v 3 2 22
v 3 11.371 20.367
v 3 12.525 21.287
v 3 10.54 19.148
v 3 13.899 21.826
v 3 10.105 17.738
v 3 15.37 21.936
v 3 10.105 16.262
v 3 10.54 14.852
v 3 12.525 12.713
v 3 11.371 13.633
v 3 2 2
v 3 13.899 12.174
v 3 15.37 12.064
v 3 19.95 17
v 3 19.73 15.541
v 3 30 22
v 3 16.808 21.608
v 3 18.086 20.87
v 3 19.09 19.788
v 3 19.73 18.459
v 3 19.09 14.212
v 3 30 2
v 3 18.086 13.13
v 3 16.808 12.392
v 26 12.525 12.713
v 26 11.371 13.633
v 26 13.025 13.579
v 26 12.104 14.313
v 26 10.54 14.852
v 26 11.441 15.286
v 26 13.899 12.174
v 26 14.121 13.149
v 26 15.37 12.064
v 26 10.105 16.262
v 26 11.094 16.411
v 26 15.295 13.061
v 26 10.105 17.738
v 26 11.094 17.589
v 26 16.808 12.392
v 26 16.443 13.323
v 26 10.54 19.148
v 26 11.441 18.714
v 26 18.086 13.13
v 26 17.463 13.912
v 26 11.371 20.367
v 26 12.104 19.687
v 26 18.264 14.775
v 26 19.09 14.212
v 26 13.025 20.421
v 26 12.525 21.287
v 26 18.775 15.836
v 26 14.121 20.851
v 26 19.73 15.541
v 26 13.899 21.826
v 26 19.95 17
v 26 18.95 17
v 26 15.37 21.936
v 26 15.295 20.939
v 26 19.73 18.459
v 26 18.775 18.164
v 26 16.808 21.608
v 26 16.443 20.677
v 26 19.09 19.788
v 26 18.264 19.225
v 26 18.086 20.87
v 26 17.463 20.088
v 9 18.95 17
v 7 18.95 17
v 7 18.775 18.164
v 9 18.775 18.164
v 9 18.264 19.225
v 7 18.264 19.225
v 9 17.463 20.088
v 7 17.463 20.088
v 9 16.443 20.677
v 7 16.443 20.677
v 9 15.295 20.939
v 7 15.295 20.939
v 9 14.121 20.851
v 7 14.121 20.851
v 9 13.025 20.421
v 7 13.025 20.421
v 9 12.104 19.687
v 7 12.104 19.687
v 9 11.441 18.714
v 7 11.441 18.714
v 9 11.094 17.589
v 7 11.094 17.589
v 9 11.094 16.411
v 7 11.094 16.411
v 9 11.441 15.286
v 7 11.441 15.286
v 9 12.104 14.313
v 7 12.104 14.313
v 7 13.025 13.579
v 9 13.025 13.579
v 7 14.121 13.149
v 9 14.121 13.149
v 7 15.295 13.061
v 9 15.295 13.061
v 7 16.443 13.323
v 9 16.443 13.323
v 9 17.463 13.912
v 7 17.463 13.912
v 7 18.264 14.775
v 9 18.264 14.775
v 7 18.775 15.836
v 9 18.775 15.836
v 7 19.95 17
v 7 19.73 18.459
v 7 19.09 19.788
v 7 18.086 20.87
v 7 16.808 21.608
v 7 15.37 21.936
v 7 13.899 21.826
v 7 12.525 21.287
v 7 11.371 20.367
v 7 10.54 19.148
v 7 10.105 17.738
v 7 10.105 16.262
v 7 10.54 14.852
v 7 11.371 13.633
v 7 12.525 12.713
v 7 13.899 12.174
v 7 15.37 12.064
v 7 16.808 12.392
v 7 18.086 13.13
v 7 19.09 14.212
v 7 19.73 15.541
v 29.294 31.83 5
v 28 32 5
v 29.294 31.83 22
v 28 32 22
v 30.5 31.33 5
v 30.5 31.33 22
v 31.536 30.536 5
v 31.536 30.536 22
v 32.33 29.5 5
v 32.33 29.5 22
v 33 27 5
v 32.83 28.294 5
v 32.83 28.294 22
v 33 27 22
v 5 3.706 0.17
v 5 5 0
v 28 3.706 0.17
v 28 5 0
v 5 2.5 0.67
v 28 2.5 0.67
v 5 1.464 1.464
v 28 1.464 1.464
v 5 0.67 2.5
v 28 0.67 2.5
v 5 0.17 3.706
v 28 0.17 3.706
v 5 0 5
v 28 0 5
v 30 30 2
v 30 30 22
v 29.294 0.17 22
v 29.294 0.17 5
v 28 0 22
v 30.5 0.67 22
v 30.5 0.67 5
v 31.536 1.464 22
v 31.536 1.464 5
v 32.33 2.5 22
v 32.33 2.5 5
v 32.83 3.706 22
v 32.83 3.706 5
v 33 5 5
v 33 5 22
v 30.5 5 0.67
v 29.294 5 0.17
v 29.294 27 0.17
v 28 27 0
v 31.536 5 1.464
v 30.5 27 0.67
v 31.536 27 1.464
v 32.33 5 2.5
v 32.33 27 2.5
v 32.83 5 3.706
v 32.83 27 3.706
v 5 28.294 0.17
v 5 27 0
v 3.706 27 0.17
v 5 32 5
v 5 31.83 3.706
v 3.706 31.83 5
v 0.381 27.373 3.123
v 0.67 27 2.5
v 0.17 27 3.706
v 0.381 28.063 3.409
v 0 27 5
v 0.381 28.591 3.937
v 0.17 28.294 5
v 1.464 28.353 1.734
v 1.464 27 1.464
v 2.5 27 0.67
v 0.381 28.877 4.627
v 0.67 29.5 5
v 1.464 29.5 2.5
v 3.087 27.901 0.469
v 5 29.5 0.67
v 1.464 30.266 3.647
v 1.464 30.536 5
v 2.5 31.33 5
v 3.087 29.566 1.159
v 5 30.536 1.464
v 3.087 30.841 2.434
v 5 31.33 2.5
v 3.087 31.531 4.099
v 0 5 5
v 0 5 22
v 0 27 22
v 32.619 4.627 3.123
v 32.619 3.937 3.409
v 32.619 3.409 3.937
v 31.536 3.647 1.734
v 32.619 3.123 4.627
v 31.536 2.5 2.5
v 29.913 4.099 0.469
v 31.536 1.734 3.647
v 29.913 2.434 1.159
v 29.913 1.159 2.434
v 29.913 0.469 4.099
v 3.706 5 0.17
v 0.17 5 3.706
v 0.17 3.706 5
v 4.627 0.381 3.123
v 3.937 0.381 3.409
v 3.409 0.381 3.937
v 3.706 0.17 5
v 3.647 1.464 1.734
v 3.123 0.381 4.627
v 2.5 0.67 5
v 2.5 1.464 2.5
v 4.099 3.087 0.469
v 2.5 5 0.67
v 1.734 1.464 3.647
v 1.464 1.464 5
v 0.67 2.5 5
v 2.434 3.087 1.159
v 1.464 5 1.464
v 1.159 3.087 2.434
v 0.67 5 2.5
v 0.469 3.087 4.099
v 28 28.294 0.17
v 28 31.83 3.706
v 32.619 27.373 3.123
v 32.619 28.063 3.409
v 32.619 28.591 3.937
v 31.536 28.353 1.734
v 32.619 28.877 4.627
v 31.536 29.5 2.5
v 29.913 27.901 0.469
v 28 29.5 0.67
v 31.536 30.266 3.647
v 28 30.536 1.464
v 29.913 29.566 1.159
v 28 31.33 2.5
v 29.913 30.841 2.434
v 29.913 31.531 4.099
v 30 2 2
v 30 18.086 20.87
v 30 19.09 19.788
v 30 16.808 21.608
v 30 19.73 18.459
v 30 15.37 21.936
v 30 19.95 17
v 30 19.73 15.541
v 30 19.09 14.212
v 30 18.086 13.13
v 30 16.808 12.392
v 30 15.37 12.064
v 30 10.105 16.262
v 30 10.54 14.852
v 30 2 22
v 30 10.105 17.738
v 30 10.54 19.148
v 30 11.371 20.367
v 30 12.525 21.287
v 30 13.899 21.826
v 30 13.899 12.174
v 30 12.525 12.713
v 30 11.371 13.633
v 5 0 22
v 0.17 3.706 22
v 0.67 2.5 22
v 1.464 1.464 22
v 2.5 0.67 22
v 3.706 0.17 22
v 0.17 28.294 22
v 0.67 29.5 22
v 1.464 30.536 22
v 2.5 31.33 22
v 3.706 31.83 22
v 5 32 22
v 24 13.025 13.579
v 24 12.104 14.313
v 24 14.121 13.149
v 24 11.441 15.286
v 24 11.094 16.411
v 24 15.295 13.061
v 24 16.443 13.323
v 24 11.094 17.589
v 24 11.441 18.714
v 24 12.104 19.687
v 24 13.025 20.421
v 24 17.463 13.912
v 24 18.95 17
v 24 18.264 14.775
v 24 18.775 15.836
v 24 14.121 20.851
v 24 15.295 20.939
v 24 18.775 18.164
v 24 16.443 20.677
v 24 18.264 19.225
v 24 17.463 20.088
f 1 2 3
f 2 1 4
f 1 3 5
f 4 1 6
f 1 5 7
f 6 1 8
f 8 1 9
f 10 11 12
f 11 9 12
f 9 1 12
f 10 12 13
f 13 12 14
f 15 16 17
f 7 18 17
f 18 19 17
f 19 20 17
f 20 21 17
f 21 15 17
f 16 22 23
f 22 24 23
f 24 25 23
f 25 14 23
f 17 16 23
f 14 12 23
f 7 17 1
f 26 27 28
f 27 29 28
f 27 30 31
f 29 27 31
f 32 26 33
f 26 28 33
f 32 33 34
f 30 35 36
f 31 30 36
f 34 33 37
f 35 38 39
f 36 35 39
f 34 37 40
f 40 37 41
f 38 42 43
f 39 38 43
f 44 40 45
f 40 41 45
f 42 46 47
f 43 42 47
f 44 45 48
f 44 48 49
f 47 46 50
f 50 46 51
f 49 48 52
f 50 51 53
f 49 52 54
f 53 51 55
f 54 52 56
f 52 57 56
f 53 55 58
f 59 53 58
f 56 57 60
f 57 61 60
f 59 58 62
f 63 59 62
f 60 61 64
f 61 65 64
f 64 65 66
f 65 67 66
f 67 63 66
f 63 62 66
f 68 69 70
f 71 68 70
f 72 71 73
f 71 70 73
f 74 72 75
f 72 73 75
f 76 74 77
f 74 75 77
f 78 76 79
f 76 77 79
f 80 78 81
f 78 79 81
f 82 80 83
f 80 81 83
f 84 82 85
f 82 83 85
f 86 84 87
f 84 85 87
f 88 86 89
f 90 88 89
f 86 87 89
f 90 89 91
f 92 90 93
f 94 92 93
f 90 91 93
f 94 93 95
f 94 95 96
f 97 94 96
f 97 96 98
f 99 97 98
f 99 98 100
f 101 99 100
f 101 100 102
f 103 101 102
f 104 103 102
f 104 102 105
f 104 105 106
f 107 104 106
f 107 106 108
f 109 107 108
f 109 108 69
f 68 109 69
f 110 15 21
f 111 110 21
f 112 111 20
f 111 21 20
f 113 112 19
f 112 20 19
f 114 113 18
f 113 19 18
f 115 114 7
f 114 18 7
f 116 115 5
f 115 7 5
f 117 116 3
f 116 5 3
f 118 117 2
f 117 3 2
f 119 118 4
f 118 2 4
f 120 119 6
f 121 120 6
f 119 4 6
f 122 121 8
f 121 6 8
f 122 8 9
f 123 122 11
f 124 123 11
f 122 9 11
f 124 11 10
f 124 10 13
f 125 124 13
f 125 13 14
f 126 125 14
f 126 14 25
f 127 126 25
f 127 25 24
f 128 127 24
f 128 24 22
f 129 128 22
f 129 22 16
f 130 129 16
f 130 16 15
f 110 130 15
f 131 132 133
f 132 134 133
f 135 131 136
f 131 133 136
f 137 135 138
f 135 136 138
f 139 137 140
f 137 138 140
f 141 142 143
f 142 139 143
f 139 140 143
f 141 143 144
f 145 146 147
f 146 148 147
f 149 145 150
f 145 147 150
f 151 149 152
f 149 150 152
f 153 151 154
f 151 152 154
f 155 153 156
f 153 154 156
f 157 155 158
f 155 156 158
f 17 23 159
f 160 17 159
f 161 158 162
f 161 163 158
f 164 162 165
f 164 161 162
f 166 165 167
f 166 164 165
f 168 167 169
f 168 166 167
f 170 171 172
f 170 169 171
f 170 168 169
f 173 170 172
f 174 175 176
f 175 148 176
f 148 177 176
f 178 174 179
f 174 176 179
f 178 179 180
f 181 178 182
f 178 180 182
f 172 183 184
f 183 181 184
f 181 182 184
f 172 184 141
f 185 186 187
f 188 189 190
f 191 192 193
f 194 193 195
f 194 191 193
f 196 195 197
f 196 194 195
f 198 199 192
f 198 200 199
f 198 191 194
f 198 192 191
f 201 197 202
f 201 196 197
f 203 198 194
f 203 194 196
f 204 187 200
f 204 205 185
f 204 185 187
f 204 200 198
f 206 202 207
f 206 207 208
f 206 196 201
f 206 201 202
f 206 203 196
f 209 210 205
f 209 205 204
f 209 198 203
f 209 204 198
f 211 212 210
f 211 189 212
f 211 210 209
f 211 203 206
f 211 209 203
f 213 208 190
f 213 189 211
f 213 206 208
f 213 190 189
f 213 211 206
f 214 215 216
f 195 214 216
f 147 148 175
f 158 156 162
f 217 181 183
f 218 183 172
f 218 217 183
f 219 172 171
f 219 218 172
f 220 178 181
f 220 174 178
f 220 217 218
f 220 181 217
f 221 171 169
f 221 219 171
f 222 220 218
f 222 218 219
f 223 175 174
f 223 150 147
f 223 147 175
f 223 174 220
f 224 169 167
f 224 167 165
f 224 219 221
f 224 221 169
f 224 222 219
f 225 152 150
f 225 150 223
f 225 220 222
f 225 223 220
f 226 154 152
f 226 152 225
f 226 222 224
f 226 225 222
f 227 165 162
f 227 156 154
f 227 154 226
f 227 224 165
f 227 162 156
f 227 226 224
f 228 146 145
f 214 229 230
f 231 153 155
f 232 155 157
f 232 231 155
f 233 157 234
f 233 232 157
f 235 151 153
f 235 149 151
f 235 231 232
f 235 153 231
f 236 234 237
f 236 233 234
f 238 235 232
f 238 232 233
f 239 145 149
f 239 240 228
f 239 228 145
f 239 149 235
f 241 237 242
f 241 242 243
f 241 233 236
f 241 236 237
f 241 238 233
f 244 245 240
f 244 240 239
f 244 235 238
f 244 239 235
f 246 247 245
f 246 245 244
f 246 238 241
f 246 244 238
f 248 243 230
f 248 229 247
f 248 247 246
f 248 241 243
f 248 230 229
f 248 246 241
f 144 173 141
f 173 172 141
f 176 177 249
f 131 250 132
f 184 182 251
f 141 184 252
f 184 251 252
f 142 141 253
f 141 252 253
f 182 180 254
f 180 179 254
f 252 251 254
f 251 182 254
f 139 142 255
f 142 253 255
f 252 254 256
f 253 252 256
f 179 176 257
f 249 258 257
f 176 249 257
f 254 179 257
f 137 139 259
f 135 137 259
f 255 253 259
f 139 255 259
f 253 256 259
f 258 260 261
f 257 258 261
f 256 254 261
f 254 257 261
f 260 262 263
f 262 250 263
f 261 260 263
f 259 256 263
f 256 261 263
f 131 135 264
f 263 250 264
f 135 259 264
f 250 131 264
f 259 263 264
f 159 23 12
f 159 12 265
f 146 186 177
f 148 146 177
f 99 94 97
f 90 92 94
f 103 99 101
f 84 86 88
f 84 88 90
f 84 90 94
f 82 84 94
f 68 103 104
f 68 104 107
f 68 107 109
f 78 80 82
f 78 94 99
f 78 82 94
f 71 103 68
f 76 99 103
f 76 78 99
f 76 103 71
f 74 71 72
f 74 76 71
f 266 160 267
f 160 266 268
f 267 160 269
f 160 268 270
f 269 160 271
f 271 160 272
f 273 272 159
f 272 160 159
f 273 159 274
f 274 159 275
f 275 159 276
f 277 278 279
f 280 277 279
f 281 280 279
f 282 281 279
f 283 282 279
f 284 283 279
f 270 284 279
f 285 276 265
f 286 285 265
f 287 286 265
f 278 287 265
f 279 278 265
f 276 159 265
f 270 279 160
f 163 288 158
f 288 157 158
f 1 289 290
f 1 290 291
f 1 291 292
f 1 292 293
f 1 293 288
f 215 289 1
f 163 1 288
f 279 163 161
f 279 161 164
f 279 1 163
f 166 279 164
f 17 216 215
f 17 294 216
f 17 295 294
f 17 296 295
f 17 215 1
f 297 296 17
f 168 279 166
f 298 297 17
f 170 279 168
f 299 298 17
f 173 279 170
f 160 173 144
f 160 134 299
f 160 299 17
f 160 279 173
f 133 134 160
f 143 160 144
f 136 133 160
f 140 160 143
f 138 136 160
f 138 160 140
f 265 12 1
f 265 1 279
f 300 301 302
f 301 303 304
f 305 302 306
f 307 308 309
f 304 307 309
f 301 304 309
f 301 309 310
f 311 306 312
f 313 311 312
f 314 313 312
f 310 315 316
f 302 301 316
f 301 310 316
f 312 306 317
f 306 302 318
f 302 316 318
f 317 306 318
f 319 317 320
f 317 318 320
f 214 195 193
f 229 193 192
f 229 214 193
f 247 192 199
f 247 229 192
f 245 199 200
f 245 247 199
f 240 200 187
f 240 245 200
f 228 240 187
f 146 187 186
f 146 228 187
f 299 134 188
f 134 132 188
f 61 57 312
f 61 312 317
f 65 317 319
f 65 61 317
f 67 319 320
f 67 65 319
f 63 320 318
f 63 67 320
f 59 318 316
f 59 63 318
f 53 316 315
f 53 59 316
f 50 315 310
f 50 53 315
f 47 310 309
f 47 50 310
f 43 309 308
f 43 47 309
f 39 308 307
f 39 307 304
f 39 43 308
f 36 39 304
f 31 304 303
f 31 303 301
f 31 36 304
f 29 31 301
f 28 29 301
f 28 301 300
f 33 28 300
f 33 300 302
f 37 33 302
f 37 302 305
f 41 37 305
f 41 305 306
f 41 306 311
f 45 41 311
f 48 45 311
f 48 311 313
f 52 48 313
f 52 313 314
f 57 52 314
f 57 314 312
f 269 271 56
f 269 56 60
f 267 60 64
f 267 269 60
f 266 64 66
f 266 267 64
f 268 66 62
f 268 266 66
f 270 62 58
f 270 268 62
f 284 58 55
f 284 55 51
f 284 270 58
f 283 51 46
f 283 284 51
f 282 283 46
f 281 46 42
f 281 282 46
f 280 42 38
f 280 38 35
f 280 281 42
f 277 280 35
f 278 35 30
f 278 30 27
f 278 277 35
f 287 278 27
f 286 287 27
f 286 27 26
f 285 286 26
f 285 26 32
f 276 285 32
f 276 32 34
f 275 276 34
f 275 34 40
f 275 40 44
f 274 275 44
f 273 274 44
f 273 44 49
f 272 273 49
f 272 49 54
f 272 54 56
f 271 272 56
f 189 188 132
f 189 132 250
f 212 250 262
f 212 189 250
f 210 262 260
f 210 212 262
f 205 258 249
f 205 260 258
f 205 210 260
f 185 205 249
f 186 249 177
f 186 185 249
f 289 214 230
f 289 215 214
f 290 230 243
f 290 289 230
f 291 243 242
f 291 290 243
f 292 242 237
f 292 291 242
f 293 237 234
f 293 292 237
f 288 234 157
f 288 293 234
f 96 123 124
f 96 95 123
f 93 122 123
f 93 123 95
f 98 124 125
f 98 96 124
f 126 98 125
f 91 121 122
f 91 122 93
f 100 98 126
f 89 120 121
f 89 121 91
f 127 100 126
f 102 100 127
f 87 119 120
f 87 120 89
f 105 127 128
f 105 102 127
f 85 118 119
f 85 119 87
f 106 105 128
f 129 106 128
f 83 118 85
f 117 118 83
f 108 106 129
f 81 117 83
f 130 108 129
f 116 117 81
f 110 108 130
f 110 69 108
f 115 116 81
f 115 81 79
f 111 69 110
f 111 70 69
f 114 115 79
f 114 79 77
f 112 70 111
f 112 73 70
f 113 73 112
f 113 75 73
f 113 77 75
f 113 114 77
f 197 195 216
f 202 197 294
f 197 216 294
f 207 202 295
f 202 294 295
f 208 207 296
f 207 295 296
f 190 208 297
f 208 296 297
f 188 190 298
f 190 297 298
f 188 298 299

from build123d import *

# Parameters (mm, degrees)
F0_W     = 3
F0_H     = 14
F0_H_2   = 2
F0_W_2   = 27
F0_H_3   = 5
F1_DEPTH = 22
F0_W_3   = 7
F0_H_4   = 10.0040441751
F2_DEPTH = 2
F3_R     = 3.95
F4_DEPTH = 9
F5_R     = 5
F3_R_2   = 4.95
F6_DEPTH = 7


with BuildPart() as f1:
    # F0 (on Top) → F1 (new body)
    with BuildSketch(Plane.XY):
        Polygon((3, 32), (0, 32), (0, 21), (3, 21), (3, 30), align=None)
        Polygon((33, 32), (3, 32), (3, 30), (30, 30), (33, 30), align=None)
        with Locations((31.5, 23)):
            Rectangle(F0_W, F0_H)
        with Locations((31.5, 9)):
            Rectangle(F0_W, F0_H)
        with Locations((31.5, 1)):
            Rectangle(F0_W, F0_H_2)
        with Locations((16.5, 1)):
            Rectangle(F0_W_2, F0_H_2)
        Polygon((3, 11), (0, 11), (0, 0), (3, 0), (3, 2), align=None)
        with Locations((1.5, 13.5)):
            Rectangle(F0_W, F0_H_3)
        with Locations((1.5, 18.5)):
            Rectangle(F0_W, F0_H_3)
    extrude(amount=F1_DEPTH)

    # F0 (on Top) → F2 (join)
    with BuildSketch(Plane.XY):
        Polygon((30, 30), (3, 30), (3, 21), (3, 16), (6.5, 16), (6.5, 26.0040441751), (13.5, 26.0040441751), (13.5, 16), (16.5, 16), (19.5, 16), (19.5, 26.0040441751), (26.5, 26.0040441751), (26.5, 16), (30, 16), align=None)
        Polygon((6.5, 16), (3, 16), (3, 11), (3, 2), (30, 2), (30, 16), (26.5, 16), (26.5, 5.9959558249), (19.5, 5.9959558249), (19.5, 16), (16.5, 16), (13.5, 16), (13.5, 5.9959558249), (6.5, 5.9959558249), align=None)
        with Locations((10, 10.9979779124)):
            Rectangle(F0_W_3, F0_H_4)
        with Locations((10, 21.0020220876)):
            Rectangle(F0_W_3, F0_H_4)
        with Locations((23, 21.0020220876)):
            Rectangle(F0_W_3, F0_H_4)
        with Locations((23, 10.9979779124)):
            Rectangle(F0_W_3, F0_H_4)
    extrude(amount=F2_DEPTH)

    # F3 (on Right) → F4 (join)
    with BuildSketch(Plane.YZ):
        with Locations((15, 17)):
            Circle(F3_R)
    extrude(amount=F4_DEPTH)

    # F5
    f5_edges = [f1.edges().sort_by_distance(p)[0] for p in [
        (16.5, 32, 0),
        (0, 16, 0),
        (16.5, 0, 0),
        (33, 16, 0),
        (33, 32, 11),
        (0, 32, 11),
        (0, 0, 11),
        (33, 0, 11),
    ]]
    fillet(f5_edges, radius=F5_R)

    # F3 (on Right) → F6 (join)
    with BuildSketch(Plane.YZ):
        with Locations((15, 17)):
            Circle(F3_R_2)
        with Locations((15, 17)):
            Circle(F3_R, mode=Mode.SUBTRACT)
    extrude(amount=F6_DEPTH)

    # F8: F1 across plane


with BuildPart() as f1_1:
    add(f1.part)
    add(f1.part.mirror(Plane.YZ.offset(16.5)))


solid = f1_1.part
